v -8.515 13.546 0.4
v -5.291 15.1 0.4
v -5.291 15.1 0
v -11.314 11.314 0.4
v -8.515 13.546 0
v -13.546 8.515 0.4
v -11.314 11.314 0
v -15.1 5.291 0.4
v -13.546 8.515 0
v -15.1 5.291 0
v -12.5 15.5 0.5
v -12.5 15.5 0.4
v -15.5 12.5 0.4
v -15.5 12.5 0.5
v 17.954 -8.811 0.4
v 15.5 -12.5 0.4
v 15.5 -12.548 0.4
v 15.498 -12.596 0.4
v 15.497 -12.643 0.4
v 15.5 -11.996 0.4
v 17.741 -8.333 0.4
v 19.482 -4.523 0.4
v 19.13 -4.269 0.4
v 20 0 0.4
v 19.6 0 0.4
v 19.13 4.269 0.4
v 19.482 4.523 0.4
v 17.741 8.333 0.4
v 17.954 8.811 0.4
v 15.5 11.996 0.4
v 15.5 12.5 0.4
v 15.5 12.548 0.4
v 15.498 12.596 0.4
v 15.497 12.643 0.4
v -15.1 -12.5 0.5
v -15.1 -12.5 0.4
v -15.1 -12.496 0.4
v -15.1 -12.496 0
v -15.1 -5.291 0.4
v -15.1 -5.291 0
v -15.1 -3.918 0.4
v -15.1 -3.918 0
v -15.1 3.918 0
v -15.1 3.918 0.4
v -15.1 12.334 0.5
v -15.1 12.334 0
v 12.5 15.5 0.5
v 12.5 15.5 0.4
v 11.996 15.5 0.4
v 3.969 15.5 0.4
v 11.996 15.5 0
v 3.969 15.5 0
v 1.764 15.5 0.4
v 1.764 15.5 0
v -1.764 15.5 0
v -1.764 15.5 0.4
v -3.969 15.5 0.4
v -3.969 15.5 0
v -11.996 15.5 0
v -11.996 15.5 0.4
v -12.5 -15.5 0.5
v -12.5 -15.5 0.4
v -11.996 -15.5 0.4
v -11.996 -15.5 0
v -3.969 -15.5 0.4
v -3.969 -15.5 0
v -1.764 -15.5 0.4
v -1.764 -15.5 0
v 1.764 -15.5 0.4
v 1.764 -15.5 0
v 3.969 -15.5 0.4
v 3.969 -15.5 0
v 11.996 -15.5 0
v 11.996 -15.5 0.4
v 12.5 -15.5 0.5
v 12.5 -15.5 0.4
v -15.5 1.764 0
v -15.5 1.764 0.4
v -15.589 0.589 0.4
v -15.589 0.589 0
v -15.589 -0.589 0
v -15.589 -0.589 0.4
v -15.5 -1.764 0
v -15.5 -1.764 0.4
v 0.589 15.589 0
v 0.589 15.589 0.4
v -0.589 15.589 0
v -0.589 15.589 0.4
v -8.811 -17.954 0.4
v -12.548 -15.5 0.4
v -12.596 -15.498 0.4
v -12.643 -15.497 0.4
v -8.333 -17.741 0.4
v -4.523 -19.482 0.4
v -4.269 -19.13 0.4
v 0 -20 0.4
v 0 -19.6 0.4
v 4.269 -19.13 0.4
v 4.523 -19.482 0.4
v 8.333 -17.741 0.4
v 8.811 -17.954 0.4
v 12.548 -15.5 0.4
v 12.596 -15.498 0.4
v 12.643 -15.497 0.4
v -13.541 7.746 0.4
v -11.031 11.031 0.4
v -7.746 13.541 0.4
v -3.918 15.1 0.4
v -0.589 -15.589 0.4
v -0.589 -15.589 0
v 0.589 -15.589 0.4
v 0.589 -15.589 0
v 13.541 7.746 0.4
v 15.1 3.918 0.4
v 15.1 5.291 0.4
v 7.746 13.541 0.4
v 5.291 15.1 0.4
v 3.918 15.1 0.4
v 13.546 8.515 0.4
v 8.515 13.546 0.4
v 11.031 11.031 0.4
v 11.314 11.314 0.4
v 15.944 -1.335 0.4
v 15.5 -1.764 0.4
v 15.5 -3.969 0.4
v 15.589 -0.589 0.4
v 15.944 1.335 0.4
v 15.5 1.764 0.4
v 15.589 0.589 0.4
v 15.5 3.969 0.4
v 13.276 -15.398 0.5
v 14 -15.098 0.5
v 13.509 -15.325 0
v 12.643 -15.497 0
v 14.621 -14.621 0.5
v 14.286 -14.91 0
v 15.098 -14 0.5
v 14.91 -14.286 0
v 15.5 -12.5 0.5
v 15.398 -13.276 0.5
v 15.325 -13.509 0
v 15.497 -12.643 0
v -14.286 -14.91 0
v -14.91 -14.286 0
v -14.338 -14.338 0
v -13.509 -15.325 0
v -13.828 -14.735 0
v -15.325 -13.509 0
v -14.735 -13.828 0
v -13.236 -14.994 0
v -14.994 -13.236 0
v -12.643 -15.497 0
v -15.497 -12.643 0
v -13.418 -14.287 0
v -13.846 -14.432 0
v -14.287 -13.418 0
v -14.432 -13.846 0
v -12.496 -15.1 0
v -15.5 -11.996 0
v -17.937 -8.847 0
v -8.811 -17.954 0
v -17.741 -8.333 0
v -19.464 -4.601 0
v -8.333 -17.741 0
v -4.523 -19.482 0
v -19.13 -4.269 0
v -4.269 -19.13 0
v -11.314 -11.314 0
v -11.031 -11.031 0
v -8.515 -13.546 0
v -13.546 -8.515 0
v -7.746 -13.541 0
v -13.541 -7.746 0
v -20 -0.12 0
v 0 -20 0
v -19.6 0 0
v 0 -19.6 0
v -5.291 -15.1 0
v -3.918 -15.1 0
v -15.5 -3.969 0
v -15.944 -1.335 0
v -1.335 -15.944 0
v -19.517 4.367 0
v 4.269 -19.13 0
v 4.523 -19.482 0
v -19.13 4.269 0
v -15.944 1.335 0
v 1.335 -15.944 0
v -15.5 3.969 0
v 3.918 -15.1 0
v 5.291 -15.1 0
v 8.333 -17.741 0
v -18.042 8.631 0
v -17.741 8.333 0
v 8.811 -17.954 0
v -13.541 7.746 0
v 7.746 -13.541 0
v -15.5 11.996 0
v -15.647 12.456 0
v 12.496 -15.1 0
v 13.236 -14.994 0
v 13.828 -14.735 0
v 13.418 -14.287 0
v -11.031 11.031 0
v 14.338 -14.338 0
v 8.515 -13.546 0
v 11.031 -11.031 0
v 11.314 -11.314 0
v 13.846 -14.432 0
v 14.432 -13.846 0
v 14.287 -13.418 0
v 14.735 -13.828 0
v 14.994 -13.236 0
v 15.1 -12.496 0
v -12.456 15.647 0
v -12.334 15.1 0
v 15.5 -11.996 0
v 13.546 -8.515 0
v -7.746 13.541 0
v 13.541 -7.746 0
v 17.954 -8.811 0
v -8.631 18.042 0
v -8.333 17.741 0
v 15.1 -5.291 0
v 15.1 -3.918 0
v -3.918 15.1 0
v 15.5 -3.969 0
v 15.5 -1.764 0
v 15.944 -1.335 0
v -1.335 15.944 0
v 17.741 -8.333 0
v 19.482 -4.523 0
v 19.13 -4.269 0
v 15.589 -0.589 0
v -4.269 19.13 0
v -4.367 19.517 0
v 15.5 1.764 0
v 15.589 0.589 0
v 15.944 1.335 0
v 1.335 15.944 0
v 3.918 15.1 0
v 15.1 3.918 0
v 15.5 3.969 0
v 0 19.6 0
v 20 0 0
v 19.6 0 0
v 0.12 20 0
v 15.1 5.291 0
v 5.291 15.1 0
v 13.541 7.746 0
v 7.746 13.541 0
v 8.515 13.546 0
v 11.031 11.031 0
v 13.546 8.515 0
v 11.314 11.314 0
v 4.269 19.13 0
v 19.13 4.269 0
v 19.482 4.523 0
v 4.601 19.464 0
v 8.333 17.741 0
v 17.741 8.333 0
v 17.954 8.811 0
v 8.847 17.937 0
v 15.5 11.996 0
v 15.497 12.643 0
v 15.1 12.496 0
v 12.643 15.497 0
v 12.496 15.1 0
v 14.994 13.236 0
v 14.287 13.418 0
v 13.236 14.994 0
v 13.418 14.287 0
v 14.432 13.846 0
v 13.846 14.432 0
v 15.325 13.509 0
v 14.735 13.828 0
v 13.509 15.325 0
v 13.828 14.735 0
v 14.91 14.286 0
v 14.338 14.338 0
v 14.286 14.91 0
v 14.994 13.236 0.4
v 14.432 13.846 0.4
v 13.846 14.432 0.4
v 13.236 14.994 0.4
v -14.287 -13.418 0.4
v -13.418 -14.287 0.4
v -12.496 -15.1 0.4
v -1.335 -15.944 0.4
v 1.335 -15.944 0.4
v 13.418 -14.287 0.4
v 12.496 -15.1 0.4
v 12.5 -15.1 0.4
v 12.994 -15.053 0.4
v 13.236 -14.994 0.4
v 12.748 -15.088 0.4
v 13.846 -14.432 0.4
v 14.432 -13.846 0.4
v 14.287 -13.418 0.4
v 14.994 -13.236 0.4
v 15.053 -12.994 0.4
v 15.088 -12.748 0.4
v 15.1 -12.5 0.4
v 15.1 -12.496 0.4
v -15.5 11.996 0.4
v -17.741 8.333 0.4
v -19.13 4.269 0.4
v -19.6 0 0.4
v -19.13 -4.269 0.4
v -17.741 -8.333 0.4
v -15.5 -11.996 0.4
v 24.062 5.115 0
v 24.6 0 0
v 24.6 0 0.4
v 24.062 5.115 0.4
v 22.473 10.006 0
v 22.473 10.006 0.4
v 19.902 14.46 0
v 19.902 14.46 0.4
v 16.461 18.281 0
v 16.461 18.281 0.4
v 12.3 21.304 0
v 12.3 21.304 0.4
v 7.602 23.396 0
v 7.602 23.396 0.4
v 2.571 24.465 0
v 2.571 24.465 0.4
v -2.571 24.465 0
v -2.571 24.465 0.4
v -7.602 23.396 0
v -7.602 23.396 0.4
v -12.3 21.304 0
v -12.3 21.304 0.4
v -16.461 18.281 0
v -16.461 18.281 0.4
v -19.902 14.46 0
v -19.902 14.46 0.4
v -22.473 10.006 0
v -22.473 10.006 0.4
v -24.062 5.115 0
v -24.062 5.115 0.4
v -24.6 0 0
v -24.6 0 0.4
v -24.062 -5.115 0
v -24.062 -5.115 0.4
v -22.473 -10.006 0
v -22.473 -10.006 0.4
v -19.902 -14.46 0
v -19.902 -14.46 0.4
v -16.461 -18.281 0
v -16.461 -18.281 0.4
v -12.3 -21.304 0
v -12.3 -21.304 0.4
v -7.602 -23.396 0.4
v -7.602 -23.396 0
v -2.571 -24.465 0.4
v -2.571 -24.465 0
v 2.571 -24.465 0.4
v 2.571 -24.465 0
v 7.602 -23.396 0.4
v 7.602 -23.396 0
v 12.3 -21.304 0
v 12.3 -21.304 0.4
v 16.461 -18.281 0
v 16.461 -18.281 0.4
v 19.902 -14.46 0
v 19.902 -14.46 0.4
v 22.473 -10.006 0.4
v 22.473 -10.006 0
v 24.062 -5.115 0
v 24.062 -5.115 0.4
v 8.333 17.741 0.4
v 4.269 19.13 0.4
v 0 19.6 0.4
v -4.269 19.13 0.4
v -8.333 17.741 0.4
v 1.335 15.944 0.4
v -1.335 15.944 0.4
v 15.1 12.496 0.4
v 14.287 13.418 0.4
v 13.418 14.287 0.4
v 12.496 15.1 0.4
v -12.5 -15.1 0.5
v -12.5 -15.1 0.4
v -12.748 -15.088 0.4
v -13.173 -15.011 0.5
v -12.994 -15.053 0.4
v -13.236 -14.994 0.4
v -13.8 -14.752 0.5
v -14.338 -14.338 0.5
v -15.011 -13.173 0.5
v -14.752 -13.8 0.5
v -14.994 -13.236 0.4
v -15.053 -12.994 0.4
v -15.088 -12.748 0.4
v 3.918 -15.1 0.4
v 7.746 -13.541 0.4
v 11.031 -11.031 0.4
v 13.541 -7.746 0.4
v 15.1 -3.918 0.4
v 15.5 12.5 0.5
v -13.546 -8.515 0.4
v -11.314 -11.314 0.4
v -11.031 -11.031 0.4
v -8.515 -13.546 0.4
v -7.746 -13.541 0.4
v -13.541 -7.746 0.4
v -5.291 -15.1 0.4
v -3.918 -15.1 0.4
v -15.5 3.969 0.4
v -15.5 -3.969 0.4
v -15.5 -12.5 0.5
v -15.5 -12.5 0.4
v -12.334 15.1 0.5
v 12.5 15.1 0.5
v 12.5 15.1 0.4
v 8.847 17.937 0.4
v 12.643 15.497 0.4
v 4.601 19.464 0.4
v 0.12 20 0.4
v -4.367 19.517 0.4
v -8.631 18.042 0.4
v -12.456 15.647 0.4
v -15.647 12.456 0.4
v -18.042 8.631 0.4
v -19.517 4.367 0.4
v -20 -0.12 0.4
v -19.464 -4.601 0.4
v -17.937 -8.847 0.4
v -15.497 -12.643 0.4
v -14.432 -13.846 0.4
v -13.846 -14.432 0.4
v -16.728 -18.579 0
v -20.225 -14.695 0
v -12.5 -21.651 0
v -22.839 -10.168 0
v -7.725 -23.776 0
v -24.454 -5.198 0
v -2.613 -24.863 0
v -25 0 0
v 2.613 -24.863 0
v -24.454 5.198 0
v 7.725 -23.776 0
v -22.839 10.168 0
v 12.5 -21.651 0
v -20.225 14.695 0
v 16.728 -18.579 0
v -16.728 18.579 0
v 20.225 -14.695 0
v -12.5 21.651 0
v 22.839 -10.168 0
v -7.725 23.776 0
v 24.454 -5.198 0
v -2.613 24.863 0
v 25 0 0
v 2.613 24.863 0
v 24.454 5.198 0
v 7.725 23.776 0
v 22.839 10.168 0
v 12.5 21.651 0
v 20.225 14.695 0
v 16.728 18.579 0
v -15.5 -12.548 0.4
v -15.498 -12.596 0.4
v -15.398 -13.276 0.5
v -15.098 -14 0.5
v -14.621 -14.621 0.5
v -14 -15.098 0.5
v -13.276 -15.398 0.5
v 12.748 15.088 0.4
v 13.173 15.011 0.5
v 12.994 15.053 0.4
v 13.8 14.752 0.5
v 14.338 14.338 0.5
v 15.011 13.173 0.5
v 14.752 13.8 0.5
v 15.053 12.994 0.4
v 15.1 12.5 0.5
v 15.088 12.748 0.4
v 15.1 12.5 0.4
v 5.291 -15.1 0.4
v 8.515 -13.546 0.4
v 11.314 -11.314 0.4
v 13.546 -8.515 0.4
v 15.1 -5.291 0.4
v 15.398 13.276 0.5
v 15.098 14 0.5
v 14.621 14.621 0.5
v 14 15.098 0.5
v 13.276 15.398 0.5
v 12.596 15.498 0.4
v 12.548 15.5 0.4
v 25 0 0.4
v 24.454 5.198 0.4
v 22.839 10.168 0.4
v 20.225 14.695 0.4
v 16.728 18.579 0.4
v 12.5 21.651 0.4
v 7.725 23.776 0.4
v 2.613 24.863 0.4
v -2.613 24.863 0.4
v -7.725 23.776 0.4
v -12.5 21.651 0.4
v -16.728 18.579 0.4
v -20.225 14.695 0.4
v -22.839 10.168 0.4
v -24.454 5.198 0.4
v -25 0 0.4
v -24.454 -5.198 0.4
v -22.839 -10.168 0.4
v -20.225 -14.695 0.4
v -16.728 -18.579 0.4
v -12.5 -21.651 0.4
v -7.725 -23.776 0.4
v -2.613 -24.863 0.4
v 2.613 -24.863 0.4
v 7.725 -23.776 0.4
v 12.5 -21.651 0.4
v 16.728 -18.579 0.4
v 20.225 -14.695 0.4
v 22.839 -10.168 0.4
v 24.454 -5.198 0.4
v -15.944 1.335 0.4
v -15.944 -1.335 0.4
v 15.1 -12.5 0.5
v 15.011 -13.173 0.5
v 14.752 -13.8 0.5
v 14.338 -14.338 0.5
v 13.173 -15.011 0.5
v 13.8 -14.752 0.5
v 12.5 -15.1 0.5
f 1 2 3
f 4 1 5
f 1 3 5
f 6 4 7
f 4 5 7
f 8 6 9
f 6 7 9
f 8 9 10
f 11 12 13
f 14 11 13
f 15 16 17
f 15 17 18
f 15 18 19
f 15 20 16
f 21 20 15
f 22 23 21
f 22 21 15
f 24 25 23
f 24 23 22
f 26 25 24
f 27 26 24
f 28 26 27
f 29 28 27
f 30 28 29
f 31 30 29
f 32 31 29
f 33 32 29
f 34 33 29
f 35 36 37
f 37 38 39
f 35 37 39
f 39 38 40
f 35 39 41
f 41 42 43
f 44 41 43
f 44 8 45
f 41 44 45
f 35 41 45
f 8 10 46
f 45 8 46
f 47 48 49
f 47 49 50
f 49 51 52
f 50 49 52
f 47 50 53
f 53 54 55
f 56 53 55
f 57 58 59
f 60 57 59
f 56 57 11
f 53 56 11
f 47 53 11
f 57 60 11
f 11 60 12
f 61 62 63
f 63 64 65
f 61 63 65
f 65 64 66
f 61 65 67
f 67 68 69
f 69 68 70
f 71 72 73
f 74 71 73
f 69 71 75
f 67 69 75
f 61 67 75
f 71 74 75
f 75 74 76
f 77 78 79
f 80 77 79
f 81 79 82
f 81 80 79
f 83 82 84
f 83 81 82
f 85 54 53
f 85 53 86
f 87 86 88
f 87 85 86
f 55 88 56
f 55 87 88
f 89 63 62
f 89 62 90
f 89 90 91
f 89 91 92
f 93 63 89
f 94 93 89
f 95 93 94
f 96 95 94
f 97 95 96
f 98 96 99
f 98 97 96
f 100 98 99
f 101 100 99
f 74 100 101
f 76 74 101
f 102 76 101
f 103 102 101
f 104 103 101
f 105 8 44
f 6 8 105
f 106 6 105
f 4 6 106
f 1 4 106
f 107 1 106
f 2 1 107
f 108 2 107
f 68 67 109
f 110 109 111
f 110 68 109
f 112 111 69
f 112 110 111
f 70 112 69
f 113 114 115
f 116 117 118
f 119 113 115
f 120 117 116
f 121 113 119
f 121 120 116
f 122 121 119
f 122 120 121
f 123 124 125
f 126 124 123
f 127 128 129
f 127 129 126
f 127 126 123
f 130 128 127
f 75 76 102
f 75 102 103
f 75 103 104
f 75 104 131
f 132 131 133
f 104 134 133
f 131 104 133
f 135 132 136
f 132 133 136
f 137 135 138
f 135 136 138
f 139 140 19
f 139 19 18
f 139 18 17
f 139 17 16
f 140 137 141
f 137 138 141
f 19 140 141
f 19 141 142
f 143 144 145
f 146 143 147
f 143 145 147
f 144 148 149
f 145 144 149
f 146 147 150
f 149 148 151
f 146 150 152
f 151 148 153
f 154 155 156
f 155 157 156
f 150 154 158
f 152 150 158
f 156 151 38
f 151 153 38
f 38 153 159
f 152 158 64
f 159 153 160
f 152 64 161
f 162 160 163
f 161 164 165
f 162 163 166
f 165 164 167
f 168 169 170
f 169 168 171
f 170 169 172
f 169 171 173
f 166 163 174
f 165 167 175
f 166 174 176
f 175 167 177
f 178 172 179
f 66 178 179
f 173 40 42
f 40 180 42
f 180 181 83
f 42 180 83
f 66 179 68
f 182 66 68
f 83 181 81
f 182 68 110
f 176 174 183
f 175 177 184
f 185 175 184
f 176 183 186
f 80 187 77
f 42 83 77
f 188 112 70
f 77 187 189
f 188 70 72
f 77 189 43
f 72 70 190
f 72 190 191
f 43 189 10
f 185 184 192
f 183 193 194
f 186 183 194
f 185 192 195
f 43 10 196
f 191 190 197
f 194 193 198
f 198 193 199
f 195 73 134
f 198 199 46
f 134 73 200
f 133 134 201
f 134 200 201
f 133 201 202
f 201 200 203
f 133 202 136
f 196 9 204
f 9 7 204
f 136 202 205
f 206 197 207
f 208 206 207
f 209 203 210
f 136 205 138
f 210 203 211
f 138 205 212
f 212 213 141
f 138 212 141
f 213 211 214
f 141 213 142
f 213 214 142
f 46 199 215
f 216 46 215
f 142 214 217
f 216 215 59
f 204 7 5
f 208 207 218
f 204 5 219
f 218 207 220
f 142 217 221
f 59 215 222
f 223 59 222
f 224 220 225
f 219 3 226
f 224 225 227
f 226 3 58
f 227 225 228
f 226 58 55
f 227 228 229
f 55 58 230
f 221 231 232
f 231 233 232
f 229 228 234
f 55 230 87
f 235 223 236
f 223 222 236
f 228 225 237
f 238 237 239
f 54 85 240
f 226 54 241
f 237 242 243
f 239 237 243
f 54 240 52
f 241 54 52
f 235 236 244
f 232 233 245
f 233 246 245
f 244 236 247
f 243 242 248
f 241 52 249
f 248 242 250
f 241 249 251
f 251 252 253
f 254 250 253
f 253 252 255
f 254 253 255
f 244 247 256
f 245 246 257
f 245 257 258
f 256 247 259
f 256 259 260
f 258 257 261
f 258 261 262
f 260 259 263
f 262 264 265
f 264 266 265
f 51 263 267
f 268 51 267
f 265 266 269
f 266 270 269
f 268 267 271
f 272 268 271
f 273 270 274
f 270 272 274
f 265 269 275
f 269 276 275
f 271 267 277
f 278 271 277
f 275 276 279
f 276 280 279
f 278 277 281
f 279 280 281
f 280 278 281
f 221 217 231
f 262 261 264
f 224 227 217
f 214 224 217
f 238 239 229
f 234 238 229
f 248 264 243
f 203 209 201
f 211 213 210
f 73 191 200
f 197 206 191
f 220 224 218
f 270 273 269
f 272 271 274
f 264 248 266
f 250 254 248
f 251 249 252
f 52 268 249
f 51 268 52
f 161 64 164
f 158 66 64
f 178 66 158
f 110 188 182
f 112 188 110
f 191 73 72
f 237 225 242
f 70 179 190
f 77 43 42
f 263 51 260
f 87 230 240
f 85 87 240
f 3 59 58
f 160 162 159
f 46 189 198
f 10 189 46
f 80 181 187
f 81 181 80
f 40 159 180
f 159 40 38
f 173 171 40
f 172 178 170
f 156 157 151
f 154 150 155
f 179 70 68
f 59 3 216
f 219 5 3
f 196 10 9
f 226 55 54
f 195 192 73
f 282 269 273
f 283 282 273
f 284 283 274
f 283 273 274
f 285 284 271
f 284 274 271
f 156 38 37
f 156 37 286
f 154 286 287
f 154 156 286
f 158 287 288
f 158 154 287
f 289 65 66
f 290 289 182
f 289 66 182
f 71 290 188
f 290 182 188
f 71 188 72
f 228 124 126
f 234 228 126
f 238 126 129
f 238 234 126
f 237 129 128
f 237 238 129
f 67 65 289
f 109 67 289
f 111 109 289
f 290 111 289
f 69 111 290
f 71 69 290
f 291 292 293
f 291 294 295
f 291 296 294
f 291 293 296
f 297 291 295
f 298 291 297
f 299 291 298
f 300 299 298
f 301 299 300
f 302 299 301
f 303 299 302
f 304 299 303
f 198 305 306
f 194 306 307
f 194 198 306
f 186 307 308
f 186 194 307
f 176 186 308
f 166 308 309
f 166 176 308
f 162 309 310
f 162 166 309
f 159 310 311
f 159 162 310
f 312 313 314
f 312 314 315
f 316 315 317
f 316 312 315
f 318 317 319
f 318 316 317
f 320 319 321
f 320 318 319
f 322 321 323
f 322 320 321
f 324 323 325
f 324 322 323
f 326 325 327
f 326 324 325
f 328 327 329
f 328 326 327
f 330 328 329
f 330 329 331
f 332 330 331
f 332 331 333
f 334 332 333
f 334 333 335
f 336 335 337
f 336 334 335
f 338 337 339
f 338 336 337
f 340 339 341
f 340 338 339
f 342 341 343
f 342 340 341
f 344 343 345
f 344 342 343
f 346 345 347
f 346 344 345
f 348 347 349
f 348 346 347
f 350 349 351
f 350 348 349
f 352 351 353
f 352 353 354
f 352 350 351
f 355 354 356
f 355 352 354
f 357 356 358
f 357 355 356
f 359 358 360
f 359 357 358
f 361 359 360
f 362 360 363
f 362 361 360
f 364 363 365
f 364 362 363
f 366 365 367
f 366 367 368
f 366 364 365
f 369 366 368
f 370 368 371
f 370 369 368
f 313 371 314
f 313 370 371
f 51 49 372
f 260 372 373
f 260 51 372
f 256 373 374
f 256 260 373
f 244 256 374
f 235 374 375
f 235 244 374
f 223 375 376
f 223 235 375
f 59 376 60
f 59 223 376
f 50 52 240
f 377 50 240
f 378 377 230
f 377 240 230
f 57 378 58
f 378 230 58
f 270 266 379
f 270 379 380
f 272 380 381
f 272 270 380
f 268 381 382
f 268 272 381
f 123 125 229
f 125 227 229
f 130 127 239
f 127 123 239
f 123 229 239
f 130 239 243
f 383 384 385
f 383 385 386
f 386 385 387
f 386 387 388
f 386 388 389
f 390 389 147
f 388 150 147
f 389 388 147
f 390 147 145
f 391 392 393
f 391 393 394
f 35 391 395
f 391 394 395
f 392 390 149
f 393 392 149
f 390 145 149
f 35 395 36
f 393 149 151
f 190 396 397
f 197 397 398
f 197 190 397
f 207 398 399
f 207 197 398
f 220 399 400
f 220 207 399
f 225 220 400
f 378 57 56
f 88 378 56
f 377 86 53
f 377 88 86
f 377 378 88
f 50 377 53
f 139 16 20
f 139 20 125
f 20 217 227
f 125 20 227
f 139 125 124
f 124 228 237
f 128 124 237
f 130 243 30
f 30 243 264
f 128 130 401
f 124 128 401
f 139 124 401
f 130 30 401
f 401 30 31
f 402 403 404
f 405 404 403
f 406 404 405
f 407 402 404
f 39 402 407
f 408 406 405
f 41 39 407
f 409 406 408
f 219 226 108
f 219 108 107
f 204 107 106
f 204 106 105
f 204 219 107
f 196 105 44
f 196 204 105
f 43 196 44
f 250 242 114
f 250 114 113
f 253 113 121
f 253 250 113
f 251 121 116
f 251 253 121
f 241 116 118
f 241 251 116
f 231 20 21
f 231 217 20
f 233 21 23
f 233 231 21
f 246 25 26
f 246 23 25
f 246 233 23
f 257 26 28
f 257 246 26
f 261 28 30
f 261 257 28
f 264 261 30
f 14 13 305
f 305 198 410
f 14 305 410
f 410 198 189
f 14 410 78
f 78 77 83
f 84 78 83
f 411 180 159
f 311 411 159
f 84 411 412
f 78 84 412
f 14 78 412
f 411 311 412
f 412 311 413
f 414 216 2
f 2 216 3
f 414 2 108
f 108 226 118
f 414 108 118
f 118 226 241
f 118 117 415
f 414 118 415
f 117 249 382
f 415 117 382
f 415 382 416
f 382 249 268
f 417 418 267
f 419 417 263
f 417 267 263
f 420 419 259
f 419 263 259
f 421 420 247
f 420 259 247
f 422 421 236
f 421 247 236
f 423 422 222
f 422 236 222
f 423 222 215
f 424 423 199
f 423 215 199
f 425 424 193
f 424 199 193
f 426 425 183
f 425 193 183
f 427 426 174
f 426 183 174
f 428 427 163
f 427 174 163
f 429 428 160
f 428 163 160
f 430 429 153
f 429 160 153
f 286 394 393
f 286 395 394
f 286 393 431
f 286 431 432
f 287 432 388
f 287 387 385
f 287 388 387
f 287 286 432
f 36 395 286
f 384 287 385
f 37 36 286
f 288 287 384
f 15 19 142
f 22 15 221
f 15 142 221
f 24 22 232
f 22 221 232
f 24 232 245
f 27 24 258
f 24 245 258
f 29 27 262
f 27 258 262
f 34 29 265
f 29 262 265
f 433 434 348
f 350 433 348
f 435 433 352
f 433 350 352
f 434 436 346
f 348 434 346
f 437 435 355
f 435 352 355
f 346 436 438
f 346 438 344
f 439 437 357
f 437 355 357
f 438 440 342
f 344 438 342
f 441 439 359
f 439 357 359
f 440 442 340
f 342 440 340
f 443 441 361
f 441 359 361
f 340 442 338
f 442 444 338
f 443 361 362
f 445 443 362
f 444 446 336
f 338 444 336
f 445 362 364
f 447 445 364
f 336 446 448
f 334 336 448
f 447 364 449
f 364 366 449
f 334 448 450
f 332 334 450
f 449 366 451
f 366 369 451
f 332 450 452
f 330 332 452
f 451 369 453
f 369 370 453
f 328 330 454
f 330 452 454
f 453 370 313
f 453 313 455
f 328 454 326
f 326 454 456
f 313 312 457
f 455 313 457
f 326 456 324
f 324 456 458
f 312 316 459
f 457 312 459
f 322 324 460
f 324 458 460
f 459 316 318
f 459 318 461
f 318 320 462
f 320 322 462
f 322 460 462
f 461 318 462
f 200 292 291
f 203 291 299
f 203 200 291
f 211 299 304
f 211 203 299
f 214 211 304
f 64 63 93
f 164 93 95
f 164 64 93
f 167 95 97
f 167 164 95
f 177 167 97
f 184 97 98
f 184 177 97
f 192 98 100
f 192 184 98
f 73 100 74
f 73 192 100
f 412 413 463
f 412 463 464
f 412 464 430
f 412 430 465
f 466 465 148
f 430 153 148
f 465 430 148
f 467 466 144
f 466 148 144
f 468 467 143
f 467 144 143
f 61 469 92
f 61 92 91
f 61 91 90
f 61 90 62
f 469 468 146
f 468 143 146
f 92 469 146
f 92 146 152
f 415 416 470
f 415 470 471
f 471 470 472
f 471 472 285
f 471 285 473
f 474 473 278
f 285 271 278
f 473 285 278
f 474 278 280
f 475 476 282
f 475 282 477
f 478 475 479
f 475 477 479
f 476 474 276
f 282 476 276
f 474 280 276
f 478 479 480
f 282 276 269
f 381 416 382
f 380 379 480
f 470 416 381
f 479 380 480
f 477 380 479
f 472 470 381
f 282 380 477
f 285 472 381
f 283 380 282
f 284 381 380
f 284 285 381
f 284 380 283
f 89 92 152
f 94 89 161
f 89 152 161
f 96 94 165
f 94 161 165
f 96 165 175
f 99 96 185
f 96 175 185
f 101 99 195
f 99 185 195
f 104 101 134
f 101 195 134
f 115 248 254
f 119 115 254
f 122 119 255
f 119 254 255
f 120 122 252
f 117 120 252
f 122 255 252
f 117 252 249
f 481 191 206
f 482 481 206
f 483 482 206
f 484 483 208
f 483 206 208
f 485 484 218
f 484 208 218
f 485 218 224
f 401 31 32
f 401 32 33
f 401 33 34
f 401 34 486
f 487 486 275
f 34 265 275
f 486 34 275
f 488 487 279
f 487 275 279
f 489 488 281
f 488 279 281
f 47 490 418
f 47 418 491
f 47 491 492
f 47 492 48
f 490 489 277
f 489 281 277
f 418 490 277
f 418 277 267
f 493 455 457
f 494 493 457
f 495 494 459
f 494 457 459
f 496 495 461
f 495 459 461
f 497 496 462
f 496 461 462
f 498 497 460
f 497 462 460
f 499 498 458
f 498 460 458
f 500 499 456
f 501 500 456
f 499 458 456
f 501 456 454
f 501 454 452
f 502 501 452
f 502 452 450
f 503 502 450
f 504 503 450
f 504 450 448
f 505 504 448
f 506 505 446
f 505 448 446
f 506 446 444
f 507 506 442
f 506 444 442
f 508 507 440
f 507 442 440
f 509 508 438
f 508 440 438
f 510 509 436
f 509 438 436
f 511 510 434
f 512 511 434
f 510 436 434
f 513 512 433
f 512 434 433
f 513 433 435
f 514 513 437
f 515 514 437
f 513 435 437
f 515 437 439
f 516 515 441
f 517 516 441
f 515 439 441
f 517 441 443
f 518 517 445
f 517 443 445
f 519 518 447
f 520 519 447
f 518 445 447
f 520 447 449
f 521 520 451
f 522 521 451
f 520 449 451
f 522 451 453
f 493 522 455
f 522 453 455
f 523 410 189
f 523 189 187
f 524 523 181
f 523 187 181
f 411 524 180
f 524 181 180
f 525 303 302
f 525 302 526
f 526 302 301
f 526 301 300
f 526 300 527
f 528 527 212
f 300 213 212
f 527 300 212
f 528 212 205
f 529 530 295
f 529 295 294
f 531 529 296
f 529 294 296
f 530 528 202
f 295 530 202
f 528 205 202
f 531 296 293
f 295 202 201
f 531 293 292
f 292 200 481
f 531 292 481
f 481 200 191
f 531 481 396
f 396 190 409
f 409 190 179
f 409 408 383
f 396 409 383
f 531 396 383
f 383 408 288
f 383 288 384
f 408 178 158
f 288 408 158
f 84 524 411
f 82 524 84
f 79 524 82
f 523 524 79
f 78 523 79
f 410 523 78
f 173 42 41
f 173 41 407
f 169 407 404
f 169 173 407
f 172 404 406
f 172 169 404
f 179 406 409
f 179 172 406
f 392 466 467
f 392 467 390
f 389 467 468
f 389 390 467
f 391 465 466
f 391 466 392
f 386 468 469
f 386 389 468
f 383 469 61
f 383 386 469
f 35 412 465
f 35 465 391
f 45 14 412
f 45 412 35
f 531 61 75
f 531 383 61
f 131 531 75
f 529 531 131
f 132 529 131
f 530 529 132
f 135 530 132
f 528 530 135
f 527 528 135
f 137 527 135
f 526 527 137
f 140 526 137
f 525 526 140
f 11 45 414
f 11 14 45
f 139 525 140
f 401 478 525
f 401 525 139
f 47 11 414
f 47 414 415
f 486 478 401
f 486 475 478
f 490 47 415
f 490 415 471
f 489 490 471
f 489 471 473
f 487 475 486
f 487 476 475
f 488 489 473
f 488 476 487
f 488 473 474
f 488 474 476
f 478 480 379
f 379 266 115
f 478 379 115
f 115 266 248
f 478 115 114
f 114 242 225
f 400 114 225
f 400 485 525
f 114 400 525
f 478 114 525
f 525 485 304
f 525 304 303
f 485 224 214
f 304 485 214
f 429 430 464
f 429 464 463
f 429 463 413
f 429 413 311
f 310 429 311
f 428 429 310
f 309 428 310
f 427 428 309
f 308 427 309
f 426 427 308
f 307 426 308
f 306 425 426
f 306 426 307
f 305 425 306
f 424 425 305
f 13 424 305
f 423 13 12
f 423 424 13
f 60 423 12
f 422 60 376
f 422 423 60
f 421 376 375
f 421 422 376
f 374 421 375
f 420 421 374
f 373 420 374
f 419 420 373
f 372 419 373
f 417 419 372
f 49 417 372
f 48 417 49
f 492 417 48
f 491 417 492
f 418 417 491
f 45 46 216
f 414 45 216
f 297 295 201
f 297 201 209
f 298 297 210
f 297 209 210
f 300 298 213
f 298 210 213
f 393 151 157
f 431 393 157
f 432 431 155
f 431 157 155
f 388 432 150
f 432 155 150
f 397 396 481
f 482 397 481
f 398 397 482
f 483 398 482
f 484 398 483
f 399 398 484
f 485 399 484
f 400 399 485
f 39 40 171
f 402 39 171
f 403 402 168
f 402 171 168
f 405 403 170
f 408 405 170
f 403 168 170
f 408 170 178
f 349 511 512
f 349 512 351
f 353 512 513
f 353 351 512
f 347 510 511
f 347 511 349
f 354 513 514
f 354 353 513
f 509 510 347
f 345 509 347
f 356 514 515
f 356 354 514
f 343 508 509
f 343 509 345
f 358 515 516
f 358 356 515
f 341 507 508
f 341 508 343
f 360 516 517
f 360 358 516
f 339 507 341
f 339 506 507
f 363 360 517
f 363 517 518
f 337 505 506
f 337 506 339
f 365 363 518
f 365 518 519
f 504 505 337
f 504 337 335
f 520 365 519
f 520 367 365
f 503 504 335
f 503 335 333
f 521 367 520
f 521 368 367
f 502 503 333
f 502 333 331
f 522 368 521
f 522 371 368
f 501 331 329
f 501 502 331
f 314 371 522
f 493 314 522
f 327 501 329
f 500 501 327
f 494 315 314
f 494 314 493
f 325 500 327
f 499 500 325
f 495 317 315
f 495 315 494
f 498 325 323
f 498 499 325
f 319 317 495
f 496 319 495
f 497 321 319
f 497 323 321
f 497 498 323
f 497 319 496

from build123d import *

# Parameters (mm, degrees)
F1_DEPTH = 0.5
F2_R     = 20
F2_R_2   = 19.6
F2_R_3   = 16
F2_R_4   = 15.6
F3_DEPTH = 0.4
F4_R     = 25
F4_R_2   = 24.6
F5_DEPTH = 0.4


with BuildPart() as f1:
    # F0 (on Top) → F1 (new body)
    with BuildSketch(Plane.XY):
        with BuildLine():
            ThreePointArc((15.5, 12.5), (14.62132, 14.62132), (12.5, 15.5))
            Line((12.5, 15.5), (-12.5, 15.5))
            Line((-12.5, 15.5), (-15.5, 12.5))
            Line((-15.5, 12.5), (-15.5, -12.5))
            ThreePointArc((-15.5, -12.5), (-14.62132, -14.62132), (-12.5, -15.5))
            Line((-12.5, -15.5), (12.5, -15.5))
            ThreePointArc((12.5, -15.5), (14.62132, -14.62132), (15.5, -12.5))
            Line((15.5, -12.5), (15.5, 12.5))
        make_face()
        with BuildLine():
            ThreePointArc((15.1, -12.5), (14.338478, -14.338478), (12.5, -15.1))
            Line((12.5, -15.1), (-12.5, -15.1))
            ThreePointArc((-12.5, -15.1), (-14.338478, -14.338478), (-15.1, -12.5))
            Line((-15.1, -12.5), (-15.1, 12.334315))
            Line((-15.1, 12.334315), (-12.334315, 15.1))
            Line((-12.334315, 15.1), (12.5, 15.1))
            ThreePointArc((12.5, 15.1), (14.338478, 14.338478), (15.1, 12.5))
            Line((15.1, 12.5), (15.1, -12.5))
        make_face(mode=Mode.SUBTRACT)
    extrude(amount=F1_DEPTH)

    # F2 (on Top) → F3 (join)
    with BuildSketch(Plane.XY):
        Circle(F2_R)
        Circle(F2_R_2, mode=Mode.SUBTRACT)
        Circle(F2_R_3)
        Circle(F2_R_4, mode=Mode.SUBTRACT)
    extrude(amount=F3_DEPTH)


with BuildPart() as f5:
    # F4 (on Top) → F5 (new body)
    with BuildSketch(Plane.XY):
        Circle(F4_R)
        Circle(F4_R_2, mode=Mode.SUBTRACT)
    extrude(amount=F5_DEPTH)


solid = Compound([f1.part, f5.part])
